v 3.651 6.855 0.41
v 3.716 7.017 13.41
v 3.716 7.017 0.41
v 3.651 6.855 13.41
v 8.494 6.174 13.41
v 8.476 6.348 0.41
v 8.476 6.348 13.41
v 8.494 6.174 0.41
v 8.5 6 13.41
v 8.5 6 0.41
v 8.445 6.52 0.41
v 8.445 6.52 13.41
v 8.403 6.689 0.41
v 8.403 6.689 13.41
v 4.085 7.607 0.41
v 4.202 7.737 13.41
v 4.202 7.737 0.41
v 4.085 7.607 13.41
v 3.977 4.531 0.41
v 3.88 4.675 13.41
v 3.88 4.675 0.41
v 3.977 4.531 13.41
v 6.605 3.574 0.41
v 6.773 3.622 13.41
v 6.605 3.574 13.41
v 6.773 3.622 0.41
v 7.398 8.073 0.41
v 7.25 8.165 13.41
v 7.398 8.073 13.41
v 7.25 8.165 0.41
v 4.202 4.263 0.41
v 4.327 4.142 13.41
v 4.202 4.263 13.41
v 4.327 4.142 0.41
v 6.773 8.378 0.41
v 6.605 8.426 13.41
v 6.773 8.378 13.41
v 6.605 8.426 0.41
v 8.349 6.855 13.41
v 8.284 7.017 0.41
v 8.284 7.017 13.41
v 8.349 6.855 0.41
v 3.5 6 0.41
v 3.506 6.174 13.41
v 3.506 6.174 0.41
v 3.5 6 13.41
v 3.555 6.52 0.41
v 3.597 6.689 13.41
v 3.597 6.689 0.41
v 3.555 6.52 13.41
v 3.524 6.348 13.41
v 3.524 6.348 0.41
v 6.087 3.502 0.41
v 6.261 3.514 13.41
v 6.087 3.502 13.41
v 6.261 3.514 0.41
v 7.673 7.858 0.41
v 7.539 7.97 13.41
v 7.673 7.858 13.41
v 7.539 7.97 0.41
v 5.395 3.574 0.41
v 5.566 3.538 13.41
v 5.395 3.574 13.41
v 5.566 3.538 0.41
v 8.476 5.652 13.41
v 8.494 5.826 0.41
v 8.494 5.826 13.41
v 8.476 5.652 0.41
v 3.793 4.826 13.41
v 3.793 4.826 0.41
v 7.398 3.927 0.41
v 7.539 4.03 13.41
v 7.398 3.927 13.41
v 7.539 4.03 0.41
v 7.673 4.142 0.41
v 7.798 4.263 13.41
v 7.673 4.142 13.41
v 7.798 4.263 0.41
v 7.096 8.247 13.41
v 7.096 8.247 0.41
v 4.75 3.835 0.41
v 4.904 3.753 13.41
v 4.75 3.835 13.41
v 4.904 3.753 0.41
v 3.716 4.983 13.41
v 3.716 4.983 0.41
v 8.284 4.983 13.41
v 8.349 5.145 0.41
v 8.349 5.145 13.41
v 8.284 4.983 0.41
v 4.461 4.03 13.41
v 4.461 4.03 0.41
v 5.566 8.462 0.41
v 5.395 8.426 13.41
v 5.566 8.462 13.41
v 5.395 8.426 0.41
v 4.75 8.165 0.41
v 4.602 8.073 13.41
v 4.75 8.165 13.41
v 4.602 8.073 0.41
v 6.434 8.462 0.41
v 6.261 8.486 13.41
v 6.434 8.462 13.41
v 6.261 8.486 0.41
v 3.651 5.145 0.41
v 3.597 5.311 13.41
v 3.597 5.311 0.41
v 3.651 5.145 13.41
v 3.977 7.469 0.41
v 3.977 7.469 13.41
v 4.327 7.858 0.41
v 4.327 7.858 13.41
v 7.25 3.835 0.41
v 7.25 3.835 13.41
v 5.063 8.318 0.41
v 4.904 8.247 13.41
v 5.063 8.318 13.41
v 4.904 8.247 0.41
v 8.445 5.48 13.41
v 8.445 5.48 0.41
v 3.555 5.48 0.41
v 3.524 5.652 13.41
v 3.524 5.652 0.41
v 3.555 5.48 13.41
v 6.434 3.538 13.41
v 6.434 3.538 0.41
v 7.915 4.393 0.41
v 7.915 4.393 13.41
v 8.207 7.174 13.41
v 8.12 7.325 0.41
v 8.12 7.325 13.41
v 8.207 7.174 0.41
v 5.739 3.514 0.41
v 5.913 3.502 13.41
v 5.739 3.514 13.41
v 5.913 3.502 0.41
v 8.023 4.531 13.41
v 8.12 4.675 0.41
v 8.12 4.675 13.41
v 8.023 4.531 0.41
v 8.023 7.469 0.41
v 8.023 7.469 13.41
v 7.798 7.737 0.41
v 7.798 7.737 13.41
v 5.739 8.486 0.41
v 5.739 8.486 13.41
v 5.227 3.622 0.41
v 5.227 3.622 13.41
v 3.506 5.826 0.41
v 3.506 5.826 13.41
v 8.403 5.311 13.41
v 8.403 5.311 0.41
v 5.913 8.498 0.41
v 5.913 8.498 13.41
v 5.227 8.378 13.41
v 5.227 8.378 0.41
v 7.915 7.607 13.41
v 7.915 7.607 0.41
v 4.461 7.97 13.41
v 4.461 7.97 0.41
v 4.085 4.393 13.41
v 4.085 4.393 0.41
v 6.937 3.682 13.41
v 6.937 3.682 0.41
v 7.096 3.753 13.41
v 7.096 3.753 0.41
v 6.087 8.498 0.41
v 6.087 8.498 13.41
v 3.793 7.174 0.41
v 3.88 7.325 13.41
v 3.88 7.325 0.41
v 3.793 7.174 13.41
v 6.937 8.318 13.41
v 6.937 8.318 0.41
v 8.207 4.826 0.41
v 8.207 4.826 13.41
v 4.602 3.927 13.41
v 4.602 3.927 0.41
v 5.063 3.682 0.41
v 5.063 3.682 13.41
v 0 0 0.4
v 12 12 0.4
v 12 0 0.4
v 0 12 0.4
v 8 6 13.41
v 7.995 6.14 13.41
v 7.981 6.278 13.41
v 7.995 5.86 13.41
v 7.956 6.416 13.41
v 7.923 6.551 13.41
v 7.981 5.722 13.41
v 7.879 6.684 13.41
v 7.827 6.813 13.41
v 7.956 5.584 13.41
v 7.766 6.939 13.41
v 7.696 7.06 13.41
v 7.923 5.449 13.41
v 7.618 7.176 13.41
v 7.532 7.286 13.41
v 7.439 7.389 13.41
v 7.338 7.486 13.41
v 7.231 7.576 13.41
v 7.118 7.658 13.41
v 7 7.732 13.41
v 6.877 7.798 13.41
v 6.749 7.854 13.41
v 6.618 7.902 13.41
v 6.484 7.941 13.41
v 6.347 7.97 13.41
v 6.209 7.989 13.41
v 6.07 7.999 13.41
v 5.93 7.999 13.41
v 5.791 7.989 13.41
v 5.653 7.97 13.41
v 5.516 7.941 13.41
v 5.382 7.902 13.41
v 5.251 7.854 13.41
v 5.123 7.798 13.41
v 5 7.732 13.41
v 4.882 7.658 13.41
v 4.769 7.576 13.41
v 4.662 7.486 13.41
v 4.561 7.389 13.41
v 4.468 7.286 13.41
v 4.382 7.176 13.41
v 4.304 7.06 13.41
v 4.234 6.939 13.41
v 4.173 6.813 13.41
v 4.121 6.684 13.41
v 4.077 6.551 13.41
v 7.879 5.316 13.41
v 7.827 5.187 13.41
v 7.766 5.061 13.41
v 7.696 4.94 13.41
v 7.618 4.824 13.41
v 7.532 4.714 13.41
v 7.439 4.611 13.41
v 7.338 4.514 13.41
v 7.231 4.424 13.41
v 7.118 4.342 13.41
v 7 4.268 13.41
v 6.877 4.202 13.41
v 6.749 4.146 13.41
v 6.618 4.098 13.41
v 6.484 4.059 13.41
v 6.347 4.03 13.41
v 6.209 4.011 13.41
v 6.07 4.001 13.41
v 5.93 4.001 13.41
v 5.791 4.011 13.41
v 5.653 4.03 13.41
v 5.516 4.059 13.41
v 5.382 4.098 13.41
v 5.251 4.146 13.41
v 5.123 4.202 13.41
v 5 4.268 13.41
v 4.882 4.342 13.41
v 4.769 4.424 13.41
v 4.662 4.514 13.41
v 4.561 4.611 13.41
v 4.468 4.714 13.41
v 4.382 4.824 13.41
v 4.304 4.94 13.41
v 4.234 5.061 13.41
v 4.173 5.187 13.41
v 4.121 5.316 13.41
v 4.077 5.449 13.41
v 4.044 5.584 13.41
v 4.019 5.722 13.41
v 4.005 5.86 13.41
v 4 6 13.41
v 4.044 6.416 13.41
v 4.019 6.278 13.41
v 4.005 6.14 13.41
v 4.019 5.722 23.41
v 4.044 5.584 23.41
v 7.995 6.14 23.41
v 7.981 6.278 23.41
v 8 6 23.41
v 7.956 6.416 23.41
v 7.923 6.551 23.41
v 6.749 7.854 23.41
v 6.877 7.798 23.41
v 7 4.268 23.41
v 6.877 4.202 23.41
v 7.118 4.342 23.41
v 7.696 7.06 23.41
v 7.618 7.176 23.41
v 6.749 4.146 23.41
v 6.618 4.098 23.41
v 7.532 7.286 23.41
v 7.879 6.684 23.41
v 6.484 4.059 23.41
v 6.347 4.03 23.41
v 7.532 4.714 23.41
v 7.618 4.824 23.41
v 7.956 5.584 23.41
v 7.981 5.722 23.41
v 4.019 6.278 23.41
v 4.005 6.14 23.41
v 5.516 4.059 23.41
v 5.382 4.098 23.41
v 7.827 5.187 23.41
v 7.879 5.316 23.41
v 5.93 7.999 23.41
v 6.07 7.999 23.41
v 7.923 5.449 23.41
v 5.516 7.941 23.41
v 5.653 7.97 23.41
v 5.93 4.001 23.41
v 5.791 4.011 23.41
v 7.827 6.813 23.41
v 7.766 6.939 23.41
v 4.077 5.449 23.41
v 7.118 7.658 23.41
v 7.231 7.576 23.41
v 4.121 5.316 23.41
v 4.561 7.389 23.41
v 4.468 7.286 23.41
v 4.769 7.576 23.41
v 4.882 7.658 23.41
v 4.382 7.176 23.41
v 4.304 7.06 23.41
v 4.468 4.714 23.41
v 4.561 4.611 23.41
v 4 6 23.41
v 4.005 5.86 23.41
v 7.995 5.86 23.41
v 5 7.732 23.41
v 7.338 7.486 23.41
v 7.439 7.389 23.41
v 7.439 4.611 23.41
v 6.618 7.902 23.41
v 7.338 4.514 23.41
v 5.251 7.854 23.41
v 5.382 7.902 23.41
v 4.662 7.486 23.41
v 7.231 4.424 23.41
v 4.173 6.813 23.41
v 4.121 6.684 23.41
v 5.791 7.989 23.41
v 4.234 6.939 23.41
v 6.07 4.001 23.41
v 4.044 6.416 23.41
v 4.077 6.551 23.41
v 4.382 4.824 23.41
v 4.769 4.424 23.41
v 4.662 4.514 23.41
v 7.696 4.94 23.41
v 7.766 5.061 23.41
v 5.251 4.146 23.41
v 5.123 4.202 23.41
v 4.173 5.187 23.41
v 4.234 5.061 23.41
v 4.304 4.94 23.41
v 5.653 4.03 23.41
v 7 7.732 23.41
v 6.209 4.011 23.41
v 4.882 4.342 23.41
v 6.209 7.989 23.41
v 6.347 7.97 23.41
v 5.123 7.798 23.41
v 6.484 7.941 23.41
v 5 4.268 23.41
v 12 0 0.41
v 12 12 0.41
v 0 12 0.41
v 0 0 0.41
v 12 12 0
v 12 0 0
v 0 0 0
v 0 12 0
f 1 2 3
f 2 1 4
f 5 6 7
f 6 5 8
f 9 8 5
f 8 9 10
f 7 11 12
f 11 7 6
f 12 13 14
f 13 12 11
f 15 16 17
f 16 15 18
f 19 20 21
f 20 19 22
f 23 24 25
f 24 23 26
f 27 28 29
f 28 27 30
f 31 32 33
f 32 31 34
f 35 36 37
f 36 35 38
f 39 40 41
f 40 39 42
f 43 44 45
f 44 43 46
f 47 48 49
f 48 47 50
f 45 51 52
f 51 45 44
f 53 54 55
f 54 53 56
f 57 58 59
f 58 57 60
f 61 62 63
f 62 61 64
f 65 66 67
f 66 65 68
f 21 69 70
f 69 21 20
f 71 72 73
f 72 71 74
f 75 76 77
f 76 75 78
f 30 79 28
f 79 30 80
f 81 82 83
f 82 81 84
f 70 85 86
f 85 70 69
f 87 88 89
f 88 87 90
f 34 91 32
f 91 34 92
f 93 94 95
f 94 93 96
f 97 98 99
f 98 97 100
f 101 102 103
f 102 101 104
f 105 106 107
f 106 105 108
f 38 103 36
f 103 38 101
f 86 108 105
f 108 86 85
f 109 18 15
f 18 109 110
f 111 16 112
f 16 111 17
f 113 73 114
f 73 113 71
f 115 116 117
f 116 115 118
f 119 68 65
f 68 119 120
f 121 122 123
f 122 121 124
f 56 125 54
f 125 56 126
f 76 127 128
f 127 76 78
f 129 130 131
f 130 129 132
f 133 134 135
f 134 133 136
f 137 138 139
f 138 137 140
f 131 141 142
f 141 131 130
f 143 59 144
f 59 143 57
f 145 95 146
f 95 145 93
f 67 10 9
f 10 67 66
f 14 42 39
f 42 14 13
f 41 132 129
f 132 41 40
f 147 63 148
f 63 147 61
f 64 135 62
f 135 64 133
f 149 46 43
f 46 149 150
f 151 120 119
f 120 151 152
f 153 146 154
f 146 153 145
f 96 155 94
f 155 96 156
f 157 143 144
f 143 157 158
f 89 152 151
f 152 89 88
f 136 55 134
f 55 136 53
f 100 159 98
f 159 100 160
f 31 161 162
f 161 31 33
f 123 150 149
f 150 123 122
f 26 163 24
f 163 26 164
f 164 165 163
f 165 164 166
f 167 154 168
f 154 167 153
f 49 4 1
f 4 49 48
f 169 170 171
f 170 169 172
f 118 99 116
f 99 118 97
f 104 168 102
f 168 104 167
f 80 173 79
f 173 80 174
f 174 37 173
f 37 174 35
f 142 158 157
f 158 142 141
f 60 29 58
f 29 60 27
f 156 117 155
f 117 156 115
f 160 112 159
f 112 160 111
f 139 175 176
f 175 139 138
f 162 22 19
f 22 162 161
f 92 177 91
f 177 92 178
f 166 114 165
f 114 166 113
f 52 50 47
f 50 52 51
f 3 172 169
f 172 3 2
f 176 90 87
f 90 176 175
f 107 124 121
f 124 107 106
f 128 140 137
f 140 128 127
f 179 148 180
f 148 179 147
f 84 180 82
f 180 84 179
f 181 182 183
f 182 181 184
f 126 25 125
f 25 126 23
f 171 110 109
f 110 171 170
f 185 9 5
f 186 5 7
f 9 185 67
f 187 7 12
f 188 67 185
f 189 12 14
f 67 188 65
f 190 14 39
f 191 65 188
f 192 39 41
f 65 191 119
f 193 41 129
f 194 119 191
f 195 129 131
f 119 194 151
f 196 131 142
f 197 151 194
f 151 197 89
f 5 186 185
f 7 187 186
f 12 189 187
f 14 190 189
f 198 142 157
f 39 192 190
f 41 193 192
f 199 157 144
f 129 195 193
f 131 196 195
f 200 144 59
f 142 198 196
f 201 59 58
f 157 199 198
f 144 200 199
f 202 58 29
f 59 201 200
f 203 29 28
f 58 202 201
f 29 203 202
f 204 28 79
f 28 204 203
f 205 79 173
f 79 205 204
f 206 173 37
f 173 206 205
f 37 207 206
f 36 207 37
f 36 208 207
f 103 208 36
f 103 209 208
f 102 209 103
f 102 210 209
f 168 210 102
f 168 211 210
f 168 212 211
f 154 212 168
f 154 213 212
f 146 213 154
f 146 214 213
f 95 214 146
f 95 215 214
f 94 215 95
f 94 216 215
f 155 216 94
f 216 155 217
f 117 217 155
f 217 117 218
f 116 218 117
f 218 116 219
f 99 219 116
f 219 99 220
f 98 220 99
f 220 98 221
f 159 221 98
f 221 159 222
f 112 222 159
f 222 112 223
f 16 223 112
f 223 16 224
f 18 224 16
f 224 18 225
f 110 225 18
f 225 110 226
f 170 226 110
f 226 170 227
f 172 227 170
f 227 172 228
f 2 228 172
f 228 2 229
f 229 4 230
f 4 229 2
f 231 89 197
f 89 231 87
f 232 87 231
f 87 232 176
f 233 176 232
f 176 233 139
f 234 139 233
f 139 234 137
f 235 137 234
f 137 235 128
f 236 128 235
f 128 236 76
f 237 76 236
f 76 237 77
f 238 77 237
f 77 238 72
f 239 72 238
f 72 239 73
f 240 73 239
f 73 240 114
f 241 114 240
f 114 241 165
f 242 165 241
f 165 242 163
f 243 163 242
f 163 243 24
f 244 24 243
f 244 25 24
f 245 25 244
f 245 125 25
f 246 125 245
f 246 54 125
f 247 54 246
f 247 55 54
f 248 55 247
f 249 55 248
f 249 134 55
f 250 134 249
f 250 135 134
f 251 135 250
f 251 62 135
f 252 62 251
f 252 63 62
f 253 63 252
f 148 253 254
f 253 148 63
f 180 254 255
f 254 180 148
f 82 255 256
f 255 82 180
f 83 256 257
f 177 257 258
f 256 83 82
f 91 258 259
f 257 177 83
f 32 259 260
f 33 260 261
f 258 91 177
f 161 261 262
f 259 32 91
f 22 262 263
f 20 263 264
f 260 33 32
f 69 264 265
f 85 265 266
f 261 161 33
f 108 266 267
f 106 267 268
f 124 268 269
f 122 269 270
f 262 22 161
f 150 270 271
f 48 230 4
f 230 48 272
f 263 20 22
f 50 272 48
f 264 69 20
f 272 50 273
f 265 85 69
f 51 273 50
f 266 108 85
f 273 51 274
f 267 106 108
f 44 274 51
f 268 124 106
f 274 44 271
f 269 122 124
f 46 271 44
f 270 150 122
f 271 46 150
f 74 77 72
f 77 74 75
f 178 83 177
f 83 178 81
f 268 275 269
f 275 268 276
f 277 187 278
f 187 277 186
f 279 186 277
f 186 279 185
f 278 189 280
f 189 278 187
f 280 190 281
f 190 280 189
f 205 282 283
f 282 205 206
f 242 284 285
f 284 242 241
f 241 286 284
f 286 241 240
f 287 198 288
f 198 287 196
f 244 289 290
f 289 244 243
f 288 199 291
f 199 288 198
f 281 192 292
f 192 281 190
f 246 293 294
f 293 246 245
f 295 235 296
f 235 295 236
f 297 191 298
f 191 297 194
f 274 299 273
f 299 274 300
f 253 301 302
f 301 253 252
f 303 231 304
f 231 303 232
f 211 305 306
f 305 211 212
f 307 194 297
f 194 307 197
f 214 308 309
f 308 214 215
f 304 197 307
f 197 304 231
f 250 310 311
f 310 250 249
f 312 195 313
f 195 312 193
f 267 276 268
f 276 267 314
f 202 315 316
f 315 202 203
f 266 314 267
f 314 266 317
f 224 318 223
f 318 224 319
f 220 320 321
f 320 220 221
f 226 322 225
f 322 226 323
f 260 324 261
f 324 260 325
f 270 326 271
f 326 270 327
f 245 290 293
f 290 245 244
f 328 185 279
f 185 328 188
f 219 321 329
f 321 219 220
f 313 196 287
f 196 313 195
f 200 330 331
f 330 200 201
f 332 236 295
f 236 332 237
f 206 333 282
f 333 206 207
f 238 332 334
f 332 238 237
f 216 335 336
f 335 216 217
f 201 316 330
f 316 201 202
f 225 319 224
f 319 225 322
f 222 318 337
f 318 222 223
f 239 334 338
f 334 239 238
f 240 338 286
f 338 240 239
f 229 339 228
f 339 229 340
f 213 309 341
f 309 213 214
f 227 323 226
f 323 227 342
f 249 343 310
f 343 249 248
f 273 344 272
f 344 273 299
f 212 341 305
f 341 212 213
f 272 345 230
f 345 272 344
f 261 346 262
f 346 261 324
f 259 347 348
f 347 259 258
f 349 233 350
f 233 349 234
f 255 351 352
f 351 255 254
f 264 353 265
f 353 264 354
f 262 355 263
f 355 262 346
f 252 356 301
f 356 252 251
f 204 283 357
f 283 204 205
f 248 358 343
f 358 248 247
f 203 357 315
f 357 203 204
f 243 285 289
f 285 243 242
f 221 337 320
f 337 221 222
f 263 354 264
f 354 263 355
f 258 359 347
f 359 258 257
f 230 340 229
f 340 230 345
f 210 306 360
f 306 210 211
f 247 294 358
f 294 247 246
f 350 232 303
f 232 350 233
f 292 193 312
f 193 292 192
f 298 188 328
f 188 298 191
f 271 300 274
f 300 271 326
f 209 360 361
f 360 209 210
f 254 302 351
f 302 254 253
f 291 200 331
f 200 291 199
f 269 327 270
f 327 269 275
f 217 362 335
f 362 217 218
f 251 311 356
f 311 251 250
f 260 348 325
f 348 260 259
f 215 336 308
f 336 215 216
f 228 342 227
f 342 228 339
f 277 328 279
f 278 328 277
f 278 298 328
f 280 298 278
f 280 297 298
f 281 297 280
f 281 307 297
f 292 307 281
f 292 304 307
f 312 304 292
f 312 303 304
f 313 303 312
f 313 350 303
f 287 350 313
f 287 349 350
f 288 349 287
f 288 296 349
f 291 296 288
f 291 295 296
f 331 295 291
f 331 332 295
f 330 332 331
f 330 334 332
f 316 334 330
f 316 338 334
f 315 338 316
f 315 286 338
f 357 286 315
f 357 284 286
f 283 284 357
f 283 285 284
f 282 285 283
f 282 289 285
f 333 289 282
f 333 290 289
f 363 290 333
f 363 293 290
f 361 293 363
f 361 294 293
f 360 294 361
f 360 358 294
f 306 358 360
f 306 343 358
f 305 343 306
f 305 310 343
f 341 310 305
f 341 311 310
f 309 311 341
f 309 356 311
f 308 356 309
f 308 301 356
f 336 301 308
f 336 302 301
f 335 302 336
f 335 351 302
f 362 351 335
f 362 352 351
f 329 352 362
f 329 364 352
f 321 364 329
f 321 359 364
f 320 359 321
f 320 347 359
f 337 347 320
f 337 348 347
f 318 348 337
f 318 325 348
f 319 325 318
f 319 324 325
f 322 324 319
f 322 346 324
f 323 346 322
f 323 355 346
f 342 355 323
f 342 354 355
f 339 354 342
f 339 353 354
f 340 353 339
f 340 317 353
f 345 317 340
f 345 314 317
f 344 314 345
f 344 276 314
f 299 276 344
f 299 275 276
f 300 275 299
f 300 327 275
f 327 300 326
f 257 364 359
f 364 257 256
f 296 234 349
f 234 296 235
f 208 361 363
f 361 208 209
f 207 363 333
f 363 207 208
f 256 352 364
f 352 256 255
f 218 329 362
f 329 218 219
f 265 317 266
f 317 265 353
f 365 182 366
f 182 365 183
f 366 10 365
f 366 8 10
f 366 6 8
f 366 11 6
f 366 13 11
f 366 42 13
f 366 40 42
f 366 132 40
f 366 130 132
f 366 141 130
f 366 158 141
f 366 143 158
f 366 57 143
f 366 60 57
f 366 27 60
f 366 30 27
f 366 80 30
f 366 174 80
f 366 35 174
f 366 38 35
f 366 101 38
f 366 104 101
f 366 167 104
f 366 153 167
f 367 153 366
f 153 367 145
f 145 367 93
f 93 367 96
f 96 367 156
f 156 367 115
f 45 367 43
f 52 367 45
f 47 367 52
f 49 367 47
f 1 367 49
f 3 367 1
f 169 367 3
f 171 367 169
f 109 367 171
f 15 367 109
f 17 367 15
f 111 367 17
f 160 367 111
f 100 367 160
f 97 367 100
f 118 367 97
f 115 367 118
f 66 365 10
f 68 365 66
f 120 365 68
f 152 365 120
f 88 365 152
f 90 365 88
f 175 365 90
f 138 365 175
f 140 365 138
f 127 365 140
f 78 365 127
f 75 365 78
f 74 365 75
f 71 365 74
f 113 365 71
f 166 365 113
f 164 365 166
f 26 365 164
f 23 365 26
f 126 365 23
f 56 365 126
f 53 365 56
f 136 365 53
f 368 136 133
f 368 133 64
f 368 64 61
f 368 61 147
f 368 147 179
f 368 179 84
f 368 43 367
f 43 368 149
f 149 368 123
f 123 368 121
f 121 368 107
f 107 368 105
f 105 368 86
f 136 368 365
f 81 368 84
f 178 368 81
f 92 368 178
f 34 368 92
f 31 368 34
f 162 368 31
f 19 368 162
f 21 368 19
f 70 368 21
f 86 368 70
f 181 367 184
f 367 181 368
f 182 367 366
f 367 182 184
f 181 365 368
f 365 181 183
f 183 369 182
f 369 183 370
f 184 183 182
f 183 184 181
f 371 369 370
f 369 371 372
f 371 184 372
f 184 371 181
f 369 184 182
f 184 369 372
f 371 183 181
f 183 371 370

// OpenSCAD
// file: ../Base/Boxes.scad
// Fischertechnik Box Foundation
// Pre-designed Boxes

use <Constants.scad>

include <PlacementOptions.scad>

box190Width = 190;
box190Depth = 130;
box130Width = 130;
box130Depth = 95;
boxUsageHeight = 33.9;
boxWallThickness = 2.4;
boxBaseThickness = 1.0;
boxWebWidth = 3.0;

// getBoxWallThickness()
// Gets the wall thickness of a Fischertechnik Box

function getBoxWallThickness() = boxWallThickness;

// Gets the usable height of a fischertechnik box
function getBoxUsageHeight() = boxUsageHeight;

// Gets the thickness of the Fischertechnik box base.
function getBoxBaseThickness() = boxBaseThickness;

// Gets the width of a box web
function getBoxWebWidth() = boxWebWidth;

// Gets the usable inner space of a Box 190 as an x/y-list
function getBox190Space() = [
    box190Width - 2*getBoxWallThickness(), 
    box190Depth - 2*getBoxWallThickness() ];

// Imports the Fischertechnik empty box 130x190 mm and places it at position 0,0
// 190x130 are the outer sizes, the inner space is slightly smaller. Use getBox190Space() to get the inner sizes.
// This module needs the STL file "Fischertechnik Box 130x190.stl" in the library path.
// The box is positioned that the usable inner space is at the 0,0,0 position. The

module Box190() {
    translate([-getBoxWallThickness(),-getBoxWallThickness(),-getBoxBaseThickness()])
        import("Fischertechnik Box 130x190.stl", convexity=3);
}

// Gets the usable inner space of a Box 130 as an x/y-list
function getBox130Space() = [
    box130Width - 2*getBoxWallThickness(), 
    box130Depth - 2*getBoxWallThickness() ];

// Imports the Fischertechnik empty box 95x130 mm and places it at position 0,0
// 190x130 are the outer sizes, the inner space is slightly smaller. Use getBox190Space() to get the inner sizes.
// This module needs the STL file "Fischertechnik Box 95x130.stl" in the library path.
// The box is positioned that the usable inner space is at the 0,0,0 position. The

module Box130() {
    translate([-getBoxWallThickness(),-getBoxWallThickness(),-getBoxBaseThickness()])
        import("Fischertechnik Box 95x130.stl", convexity=3);
}

// Creates a web at the specified box walls
// corner 0 = LowerLeft, 1 = UpperLeft, 2 = UpperRight, 3 = LowerRight
// side 0 = LeftOfCorner, 1 = RightOfCorner
// distance = Distance in mm from the corner
// box = inner width and depth of the box (default: Box 190)
// webWidth = length of the web (default is 3 mms)
// webThickness = thickness of the web (default is 1 mm)

module BoxWeb(corner, side, distance, box=getBox190Space(), webWidth=getBoxWebWidth(), webThickness=1.0) {
    sink = getBoxWallThickness()/2;

    width = (corner % 2 == 0) ? 
            (side == LeftOfCorner ? webWidth : webThickness) :
            (side == LeftOfCorner ? webThickness : webWidth);

    depth = (corner % 2 == 0) ? 
            (side == RightOfCorner ? webWidth : webThickness) :
            (side == RightOfCorner ? webThickness : webWidth);
    
    xDiff = corner == LowerLeft ? 
                (side == LeftOfCorner ? -sink : distance) :
            (corner == UpperLeft ?                
                (side == LeftOfCorner ? distance : -sink) :
            (corner == UpperRight ?
                (side == LeftOfCorner ? box.x-webWidth+sink : box.x-distance-webThickness) :
                (side == LeftOfCorner ? box.x-distance-webThickness: box.x-webWidth+sink)));

    yDiff = corner == LowerLeft ? 
                (side == RightOfCorner ? -sink : distance) :
            (corner == UpperLeft ?
                (side == RightOfCorner ? box.y-distance : box.y-webWidth+sink) :
            (corner == UpperRight ?
                (side == RightOfCorner ? box.y-webWidth+sink : box.y-distance) :
                (side == RightOfCorner ? distance : -sink)));
    
    translate([xDiff, yDiff, -getExcess()])
        cube([width, depth, boxUsageHeight + 2*getExcess()]);
}
// file: ../Base/Rotation.scad
// Fischertechnik Box Foundation
// Geometry Helpers Rotation

include <PlacementOptions.scad>

// getRotatedSpace(space, rotation=NoRotation)
// Rotates the space dependent on the specified rotation

function getRotatedSpace(space, rotation=NoRotation) = [
    (rotation == Rotate90 || rotation == Rotate270) ? space.y : space.x,
    (rotation == Rotate90 || rotation == Rotate270) ? space.x : space.y
];

// Rotates the given space around the fixed left lower corner
// space = the space the children needs as width/depth list [width,depth]
// rotation = 0 Rotate0 degrees, 1 Rotate90 degrees, 2 Rotate180 degrees, 3 Rotate270 degrees (equivalent to -90)

module RotateFix(space, rotation=Rotate0) {
    dy = (rotation == Rotate0 || rotation == Rotate270) ? 0 :
        (rotation == Rotate90) ? space.x :
        space.y;
    dx = (rotation < Rotate180) ? 0 :
        (rotation == Rotate180) ? space.x :
        space.y;
    
    translate([dx, dy, 0])
        rotate([0, 0, rotations[rotation]])
            children();
}
// file: ../Base/Alignment.scad
// Fischertechnik Box Foundation
// Geometry Helpers Alignment

include <PlacementOptions.scad>

// getAlignedX(elementWidth, spaceWidth, align=AlignRight, offset=0)
// Gets the aligned X offset of an element with the given
// width in the given space.
// elementWidth = The width of the element to positon
// spaceWidth = The space where the element should be aligned
// align = 0 AlignLeft, 1 AlignCenter, 2 AlignRight
// offset = an optional offset from the aligned position. When
// aligned left or centered, then positive values are in X direction.
// When aligned right then positive values are in negative X direction.

function getAlignedX(elementWidth, spaceWidth, align=AlignRight, offset=0) =
    (align == AlignLeft) ?
        offset :
        ((align == AlignCenter) ?
        (spaceWidth - elementWidth)/2 + offset :
        spaceWidth - offset - elementWidth);

// getAlignedY(elementDepth, spaceDepth, align=AlignTop, offset=0)
// Gets the aligned Y offset of an element with the given
// depth in the given space.
// elementDepth = The depth of the element to positon
// spaceDepth = The space where the element should be aligned
// align = 0 AlignBottom, 1 AlignCenter, 2 AlignTop
// offset = an optional offset from the aligned position. When
// aligned bottom or centered, then positive values are in Y direction.
// When aligned top then positive values are in negative Y direction.

function getAlignedY(elementDepth, spaceDepth, align=AlignTop, offset=0) =
    (align == AlignBottom) ?
        offset :
        ((align == AlignCenter) ?
        (spaceDepth - elementDepth)/2 + offset :
        spaceDepth - offset - elementDepth);
// file: ../Base/PlacementOptions.scad
// Fischertechnik Box Foundation
// Placement Options

// Alignment
NoAlign = 0;
AlignLeft = 1;
AlignBottom = 2;
AlignCenter = 3;
AlignRight = 4;
AlignTop = 5;

// Element rotation degree steps
rotations = [0, -90, -180, -270];

// Rotation
NoRotation = 0;
Rotate0 = 0;
Rotate90 = 1;
Rotate180 = 2;
Rotate270 = 3;

// Docking (seen from above)
NoDock = -1;
DockLeft = 0;
DockTop = 1;
DockRight = 2;
DockCorner = 2;
DockBottom = 3;

// Web corners
LowerLeft = 0;
UpperLeft = 1;
UpperRight = 2;
LowerRight = 3;

// Web position relative to corner
LeftOfCorner = 0;
RightOfCorner = 1;
// file: ../Base/Placement.scad
// Fischertechnik Box Foundation
// Geometry Helpers Placement

use <Constants.scad>
use <Alignment.scad>
use <Rotation.scad>
use <Boxes.scad>

include <PlacementOptions.scad>

// Place(x=0, y=0, elementSpace=[0,0], alignX=AlignLeft, alignY=AlignBottom, rotation=Rotate0, boxSpace=getBox190Space())
// Places the child at the specified position
// y = Y-Position. This is a relative position when an X aligment is specified.
// x = X-Position. This is a relative position when an Y aligment is specified.
// elementSpace = space of the element to be placed [x,y]
// alignX = -1=NoAlign, 0 AlignLeft, 1 AlignCenter, 3 AlignRight (elementSpace and boxSpace required!)
// alignY = -1=NoAlign, 2 AlignBottom, 1 AlignCenter, 4 AlignTop (elementSpace and boxSpace required!)
// rotation = 0 Rotate0 0 degrees, 1 Rotate90 90 degrees, 
// 2 Rotate180 180 degrees, 3 Rotate270 270 degrees (equivalent to -90)
// boxSpace = Inner space of the box where the placement occurs [x,y] - default is Box 190x130 inner space

module Place(x=0, y=0, elementSpace=[0,0], 
  alignX=AlignLeft, alignY=AlignBottom, 
  rotation=NoRotation, boxSpace=getBox190Space()) {

    module Position(x, y, space, rotation=Rotate0) {
        translate([x, y, 0])
            RotateFix(space, rotation)
                children();
    }

    space = getRotatedSpace(elementSpace, rotation);
    alignedX = getAlignedX(space.x, boxSpace.x, alignX, x);
    alignedY = getAlignedY(space.y, boxSpace.y, alignY, y);
    Position(alignedX, alignedY, elementSpace, rotation)
        children();
}

// Center(space=getBox130Space(), elementSpace=[0,0])
// space = Space where the children is centered. For cylinder use centered=true and no elementSpace.
// elementSpace = space of the element to be centered [x,y]

module Center(space=getBox190Space(), elementSpace=[0,0]) {
    translate([(space.x - elementSpace.x) / 2, (space.y - elementSpace.y) / 2])
        children(0);
}

// CenterHorizontal(width=0, y=0, offset=0, space=getBox130Space())
// space = Space where the children is centered. For cylinder use centered=true and no elementSpace.
// elementSpace = space of the element to be centered [x,y]

module CenterHorizontal(width=0, y=0, offset=0, space=getBox190Space()) {
    translate([(space.x - width) / 2 + offset, y])
        children(0);
}

// CenterVertical(depth=0, x=0, offset=0, space=getBox130Space())
// space = Space where the children is centered. For cylinder use centered=true and no elementSpace.
// elementSpace = space of the element to be centered [x,y]

module CenterVertical(depth=0, x=0, offset=0, space=getBox190Space()) {
    translate([x, (space.y - depth) / 2 + offset])
        children(0);
}
// file: ../Elements/AxisClip10.scad
// Fischertechnik Box Library
// Axis for clip 10
// 31023

use <../ModelBase/Simple.scad>

width = 12;
depth = 12;
height = 23;

// getAxisClip10Space()
// Gets the space of a frame for a clip 10 with spring ring (mot2)

function getAxisClip10Space() = [width, depth, height];

// AxisClip10()
// Axis for clip 10 with spring ring (mot2)

module AxisClip10() {
    LeveledAxisWithSpace(height, height-10, getAxisClip10Space());
}

// Tests
color("lightgray")
AxisClip10();
// file: ../Base/Constants.scad
// Fischertechnik Box Foundation
// Constants

// Constant values necessary for multiple elements

// Base constants
dividerThickness = 1.2;
excess = 0.01;
fragments = 90;
tolerance = 0.8;

// Gets the thickness of a divider 
function getDividerThickness() = dividerThickness;

// Gets the excess that is used to merge walls into each other
function getExcess() = excess;

// Gets amount of fragments of a cylinder
function getFragments() = fragments;

// Gets the inner tolerance of a frame to each side
function getTolerance() = tolerance;


// Fischertechnik specific constants
axisDiameter = 4;
axisBottomDiameter = axisDiameter + 1;
standardEdgeDistance = 2.5;
standardWebDistance = 11.5;
standardCornerLength = 15;
tubeWallFactor = 0.8;

// Gets axis diameter
function getAxisDiameter() = axisDiameter;

// Gets axis bottom diameter for thicker part at the bottom
function getAxisBottomDiameter() = axisBottomDiameter;

// gets the standard distance to the wall of the box for dockable frames with webs
function getStandardEdgeDistance() = standardEdgeDistance;

// gets the standard distance of each web to the corner of the dockable frame
function getStandardWebDistance() = standardWebDistance;

// gets the standard length of the corner walls of a dockable frame
function getStandardCornerLength() = standardCornerLength;

// gets the wall thickness of a tube.
function getTubeWallThickness() = tubeWallFactor * getDividerThickness();
// main file
// 3D Print Test Base

use <../Base/Constants.scad>

use <../Elements/AxisClip10.scad>

module TestPrint(elementSpace) {
    cube([elementSpace.x, elementSpace.y, 0.4]);
    translate([0,0,0.4+getExcess()]) {
        children();
    }
}

TestPrint(getAxisClip10Space())
    AxisClip10();
